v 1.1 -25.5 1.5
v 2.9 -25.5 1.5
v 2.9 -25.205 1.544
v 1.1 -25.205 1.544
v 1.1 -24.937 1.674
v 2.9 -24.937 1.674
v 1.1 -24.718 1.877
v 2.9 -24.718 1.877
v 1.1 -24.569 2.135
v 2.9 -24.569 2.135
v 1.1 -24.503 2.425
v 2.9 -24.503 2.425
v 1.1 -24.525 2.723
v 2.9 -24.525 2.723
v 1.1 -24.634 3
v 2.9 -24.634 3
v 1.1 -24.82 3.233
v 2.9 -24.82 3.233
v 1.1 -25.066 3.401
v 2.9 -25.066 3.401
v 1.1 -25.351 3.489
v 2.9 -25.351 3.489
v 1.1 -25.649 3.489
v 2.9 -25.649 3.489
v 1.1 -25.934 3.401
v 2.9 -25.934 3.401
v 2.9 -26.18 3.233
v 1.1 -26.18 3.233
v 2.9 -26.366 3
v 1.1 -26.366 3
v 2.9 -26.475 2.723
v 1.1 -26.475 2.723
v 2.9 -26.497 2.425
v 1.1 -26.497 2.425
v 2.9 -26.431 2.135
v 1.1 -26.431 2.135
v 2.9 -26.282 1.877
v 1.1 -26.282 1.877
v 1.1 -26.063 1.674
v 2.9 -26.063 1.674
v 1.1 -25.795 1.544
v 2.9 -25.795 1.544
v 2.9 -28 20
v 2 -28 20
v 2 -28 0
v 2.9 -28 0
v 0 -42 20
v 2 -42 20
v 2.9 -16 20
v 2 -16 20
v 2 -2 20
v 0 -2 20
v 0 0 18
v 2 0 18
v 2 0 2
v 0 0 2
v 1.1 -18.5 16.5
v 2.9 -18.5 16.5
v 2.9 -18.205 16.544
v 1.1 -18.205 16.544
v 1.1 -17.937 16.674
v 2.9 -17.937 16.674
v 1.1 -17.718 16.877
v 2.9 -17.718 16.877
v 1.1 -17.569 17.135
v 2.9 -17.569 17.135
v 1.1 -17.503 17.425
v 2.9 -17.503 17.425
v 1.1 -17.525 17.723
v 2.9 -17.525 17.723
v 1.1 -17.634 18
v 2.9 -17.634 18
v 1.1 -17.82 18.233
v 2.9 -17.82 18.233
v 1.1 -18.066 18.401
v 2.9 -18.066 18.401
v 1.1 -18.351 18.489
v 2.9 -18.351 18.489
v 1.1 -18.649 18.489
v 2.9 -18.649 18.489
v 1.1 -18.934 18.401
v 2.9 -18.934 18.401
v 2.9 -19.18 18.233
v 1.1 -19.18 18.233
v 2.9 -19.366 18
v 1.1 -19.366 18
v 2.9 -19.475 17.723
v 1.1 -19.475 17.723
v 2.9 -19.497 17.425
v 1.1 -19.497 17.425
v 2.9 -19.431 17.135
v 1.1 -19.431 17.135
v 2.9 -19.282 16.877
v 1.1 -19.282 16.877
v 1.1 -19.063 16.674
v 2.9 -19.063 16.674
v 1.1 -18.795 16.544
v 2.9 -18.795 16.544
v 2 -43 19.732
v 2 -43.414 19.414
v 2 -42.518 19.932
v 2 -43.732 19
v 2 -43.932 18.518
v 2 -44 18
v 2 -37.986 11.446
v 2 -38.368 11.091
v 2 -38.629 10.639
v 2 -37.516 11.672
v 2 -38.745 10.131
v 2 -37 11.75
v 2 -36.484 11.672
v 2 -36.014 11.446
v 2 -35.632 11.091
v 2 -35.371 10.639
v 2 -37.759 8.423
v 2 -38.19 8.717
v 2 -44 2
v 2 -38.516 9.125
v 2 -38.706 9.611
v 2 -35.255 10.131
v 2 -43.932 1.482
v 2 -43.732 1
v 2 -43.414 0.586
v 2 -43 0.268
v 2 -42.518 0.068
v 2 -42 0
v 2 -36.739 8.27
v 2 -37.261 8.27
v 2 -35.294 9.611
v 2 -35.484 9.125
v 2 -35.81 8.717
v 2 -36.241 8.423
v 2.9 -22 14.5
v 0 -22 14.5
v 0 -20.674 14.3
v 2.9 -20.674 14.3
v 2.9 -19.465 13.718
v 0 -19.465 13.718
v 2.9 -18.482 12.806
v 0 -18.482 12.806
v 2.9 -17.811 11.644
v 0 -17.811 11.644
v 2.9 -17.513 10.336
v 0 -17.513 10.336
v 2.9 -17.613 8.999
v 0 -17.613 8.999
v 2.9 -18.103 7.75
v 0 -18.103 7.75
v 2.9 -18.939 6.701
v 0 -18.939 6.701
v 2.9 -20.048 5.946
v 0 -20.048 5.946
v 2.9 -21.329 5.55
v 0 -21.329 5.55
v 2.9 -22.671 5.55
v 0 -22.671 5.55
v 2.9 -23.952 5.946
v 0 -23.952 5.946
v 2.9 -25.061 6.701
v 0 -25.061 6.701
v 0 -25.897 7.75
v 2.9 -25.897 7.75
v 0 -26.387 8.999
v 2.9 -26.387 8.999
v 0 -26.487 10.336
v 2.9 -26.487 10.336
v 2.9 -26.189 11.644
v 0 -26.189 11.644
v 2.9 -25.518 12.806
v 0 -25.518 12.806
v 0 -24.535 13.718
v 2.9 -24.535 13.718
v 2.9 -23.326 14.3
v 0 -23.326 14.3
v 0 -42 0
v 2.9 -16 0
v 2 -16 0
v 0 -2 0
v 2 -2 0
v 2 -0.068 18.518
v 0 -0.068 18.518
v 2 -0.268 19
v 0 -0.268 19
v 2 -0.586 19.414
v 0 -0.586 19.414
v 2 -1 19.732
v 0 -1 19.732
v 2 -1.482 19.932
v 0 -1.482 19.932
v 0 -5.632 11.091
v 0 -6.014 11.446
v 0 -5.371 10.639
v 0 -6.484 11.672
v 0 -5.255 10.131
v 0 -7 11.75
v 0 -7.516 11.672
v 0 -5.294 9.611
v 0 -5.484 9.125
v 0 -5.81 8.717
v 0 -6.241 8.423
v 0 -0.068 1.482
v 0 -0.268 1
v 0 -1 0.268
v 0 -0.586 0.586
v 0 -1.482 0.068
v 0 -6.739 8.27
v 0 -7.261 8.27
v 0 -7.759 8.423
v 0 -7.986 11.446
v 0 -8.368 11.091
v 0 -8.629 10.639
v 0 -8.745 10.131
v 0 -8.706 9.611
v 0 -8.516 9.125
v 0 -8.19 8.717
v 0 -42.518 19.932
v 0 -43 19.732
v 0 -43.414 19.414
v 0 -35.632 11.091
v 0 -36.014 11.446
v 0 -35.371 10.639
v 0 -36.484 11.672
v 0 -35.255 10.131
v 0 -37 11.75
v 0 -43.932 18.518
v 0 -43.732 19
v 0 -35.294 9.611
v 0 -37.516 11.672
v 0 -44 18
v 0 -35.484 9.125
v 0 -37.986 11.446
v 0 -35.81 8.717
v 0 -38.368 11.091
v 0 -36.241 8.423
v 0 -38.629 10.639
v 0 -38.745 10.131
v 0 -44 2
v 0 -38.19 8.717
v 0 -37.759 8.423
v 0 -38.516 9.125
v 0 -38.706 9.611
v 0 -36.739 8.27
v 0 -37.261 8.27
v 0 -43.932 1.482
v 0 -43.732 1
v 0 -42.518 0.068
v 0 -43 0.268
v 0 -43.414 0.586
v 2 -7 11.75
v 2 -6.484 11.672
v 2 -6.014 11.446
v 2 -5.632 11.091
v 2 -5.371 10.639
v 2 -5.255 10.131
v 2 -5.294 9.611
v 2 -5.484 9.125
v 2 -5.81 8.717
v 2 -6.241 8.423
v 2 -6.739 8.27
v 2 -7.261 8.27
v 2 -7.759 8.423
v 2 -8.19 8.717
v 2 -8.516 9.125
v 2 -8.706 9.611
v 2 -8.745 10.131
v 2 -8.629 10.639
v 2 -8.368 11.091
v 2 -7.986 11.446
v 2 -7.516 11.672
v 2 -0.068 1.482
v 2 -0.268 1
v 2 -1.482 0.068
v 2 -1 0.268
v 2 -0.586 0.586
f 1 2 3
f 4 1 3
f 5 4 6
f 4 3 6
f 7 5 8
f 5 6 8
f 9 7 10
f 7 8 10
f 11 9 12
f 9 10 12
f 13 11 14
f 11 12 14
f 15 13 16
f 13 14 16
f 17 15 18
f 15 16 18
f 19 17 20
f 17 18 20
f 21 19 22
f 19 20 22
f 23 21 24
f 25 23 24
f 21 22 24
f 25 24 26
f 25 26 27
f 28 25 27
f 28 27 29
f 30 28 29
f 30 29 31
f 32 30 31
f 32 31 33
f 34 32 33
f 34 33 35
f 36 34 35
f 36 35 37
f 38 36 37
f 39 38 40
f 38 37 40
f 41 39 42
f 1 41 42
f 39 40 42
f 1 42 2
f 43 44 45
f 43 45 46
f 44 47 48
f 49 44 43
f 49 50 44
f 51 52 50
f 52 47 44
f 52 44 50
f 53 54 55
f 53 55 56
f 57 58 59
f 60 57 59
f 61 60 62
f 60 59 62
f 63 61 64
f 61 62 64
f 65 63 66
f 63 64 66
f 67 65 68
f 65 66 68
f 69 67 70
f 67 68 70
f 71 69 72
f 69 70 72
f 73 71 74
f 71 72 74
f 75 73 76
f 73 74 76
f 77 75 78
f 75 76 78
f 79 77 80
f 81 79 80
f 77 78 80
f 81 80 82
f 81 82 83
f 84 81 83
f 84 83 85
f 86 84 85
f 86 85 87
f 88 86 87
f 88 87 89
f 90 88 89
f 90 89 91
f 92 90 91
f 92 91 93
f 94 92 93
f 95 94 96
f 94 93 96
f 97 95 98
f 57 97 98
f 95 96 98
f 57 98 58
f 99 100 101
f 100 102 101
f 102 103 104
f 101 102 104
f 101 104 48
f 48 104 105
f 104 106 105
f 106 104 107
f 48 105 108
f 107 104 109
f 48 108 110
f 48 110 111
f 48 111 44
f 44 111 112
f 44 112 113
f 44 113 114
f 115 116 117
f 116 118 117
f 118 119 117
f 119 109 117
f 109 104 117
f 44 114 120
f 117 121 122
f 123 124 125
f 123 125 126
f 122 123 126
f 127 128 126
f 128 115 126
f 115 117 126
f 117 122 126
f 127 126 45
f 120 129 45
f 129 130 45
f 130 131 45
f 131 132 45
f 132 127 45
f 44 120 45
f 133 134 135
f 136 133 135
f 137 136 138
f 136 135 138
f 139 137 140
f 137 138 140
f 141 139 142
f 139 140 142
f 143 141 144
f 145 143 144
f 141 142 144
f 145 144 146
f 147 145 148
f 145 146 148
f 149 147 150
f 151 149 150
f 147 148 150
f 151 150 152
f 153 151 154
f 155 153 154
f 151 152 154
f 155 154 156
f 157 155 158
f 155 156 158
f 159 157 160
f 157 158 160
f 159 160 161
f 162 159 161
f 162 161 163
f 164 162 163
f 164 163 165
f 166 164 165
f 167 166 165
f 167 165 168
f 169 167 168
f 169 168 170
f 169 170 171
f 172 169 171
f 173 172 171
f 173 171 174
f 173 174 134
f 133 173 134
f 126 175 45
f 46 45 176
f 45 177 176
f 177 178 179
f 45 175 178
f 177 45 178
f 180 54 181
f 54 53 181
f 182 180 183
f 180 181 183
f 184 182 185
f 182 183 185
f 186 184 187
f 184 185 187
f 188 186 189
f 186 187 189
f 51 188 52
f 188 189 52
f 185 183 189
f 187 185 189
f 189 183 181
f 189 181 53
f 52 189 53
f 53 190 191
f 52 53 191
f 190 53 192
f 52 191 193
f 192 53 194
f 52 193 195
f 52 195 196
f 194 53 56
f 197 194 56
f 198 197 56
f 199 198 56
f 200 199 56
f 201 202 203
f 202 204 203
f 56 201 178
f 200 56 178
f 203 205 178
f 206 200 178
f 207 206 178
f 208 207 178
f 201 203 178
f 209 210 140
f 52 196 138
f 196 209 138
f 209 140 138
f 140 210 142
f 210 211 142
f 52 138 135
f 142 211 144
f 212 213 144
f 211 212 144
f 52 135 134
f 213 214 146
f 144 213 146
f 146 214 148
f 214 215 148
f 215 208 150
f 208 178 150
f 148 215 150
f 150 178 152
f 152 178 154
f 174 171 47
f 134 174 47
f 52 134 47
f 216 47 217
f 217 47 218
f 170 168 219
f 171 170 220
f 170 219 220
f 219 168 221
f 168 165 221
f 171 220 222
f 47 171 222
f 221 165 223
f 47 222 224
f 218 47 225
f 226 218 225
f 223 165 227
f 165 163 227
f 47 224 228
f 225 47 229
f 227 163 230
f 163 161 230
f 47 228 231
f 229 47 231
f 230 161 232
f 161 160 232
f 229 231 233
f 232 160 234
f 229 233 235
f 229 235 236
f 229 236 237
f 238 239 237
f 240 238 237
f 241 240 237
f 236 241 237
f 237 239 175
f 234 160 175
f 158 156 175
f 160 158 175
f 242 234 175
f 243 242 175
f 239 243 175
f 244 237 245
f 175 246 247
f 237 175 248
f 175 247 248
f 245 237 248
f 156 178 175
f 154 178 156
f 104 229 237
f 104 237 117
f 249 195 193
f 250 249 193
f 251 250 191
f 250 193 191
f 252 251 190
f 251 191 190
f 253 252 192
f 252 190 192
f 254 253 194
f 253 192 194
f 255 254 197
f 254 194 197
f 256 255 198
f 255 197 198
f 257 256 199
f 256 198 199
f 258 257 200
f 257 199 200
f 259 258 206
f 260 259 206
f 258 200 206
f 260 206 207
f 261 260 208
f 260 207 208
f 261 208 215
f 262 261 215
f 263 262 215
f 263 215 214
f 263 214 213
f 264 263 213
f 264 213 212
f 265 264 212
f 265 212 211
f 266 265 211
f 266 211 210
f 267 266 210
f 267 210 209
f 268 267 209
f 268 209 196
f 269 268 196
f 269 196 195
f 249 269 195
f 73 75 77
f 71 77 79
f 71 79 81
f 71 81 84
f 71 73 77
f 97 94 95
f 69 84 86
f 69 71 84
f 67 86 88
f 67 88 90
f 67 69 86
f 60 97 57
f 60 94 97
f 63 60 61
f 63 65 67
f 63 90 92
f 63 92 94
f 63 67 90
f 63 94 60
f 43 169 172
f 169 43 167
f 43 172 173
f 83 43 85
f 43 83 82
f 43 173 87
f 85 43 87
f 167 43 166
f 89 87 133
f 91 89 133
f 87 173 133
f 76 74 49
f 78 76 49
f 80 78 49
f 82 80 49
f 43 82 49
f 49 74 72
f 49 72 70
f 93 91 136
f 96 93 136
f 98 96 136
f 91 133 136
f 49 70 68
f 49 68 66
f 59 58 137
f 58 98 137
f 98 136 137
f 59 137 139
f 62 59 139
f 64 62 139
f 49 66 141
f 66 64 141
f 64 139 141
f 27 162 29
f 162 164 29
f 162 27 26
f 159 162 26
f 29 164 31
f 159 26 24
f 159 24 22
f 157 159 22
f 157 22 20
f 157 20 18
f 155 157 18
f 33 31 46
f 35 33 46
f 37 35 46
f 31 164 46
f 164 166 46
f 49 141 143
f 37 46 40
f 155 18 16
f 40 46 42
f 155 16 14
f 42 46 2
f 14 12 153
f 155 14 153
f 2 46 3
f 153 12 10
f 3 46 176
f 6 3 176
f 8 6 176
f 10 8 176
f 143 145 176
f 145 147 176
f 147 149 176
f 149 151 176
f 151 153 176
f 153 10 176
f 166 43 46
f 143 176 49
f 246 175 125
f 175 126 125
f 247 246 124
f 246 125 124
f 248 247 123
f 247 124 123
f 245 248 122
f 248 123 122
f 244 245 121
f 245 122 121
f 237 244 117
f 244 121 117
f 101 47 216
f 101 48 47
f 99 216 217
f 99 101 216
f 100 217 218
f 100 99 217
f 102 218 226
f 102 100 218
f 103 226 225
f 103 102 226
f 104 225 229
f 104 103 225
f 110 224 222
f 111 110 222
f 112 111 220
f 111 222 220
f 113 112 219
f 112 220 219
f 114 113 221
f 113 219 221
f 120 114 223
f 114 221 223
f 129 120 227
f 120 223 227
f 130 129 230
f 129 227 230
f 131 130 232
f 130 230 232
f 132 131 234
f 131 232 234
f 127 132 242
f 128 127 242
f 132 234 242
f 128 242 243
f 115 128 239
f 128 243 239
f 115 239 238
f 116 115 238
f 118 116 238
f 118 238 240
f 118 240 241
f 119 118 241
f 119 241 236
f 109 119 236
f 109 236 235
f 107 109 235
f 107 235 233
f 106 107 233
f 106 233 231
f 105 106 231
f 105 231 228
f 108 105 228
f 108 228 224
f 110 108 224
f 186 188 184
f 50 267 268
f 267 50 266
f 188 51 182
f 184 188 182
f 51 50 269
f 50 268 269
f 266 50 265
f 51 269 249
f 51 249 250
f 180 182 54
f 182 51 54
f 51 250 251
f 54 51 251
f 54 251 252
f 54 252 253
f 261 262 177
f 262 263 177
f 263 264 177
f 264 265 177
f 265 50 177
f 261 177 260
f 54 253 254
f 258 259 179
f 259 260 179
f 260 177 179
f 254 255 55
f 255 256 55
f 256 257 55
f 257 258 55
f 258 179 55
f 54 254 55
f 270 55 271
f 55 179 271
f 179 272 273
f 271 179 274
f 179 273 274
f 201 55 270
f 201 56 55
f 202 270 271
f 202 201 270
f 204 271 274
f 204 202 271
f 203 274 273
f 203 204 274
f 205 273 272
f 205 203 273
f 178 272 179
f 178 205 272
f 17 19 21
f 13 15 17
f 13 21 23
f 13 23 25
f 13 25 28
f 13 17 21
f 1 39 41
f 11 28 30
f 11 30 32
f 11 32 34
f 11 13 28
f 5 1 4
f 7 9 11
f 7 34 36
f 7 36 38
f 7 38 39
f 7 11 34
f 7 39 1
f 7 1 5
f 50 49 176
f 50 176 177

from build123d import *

# Parameters (mm, degrees)
BOSS_EXTRUDE1_DEPTH = 20
SKETCH2_R           = 1.75
SKETCH2_R_2         = 4.5
CUT_EXTRUDE1_DEPTH  = 3.9
SKETCH3_R           = 1
CUT_EXTRUDE2_DEPTH  = 1.8
FILLET1_R           = 2


with BuildPart() as part:
    # Sketch1 → Boss-Extrude1 (new body)
    with BuildSketch(Plane.XY):
        Polygon((0, 0), (0, -44), (2, -44), (2, -28), (2.9, -28), (2.9, -16), (2, -16), (2, 0), align=None)
    extrude(amount=BOSS_EXTRUDE1_DEPTH)

    # Sketch2 → Cut-Extrude1 (cut, through all)
    with BuildSketch(Plane.ZY):
        with Locations((10, -7)):
            Circle(SKETCH2_R)
        with Locations((10, -37)):
            Circle(SKETCH2_R)
        with Locations((10, -22)):
            Circle(SKETCH2_R_2)
    extrude(amount=-CUT_EXTRUDE1_DEPTH, mode=Mode.SUBTRACT)

    # Sketch3 → Cut-Extrude2 (cut)
    with BuildSketch(Plane(origin=(2.9, 0, 0), x_dir=(0, 0, -1), z_dir=(1, 0, 0))):
        with Locations((-17.5, -18.5)):
            Circle(SKETCH3_R)
        with Locations((-2.5, -25.5)):
            Circle(SKETCH3_R)
    extrude(amount=-CUT_EXTRUDE2_DEPTH, mode=Mode.SUBTRACT)

    # Fillet1
    fillet1_edges = [part.edges().sort_by_distance(p)[0] for p in [
        (1, -44, 20),
        (1, 0, 0),
        (1, 0, 20),
        (1, -44, 0),
    ]]
    fillet(fillet1_edges, radius=FILLET1_R)


solid = part.part
